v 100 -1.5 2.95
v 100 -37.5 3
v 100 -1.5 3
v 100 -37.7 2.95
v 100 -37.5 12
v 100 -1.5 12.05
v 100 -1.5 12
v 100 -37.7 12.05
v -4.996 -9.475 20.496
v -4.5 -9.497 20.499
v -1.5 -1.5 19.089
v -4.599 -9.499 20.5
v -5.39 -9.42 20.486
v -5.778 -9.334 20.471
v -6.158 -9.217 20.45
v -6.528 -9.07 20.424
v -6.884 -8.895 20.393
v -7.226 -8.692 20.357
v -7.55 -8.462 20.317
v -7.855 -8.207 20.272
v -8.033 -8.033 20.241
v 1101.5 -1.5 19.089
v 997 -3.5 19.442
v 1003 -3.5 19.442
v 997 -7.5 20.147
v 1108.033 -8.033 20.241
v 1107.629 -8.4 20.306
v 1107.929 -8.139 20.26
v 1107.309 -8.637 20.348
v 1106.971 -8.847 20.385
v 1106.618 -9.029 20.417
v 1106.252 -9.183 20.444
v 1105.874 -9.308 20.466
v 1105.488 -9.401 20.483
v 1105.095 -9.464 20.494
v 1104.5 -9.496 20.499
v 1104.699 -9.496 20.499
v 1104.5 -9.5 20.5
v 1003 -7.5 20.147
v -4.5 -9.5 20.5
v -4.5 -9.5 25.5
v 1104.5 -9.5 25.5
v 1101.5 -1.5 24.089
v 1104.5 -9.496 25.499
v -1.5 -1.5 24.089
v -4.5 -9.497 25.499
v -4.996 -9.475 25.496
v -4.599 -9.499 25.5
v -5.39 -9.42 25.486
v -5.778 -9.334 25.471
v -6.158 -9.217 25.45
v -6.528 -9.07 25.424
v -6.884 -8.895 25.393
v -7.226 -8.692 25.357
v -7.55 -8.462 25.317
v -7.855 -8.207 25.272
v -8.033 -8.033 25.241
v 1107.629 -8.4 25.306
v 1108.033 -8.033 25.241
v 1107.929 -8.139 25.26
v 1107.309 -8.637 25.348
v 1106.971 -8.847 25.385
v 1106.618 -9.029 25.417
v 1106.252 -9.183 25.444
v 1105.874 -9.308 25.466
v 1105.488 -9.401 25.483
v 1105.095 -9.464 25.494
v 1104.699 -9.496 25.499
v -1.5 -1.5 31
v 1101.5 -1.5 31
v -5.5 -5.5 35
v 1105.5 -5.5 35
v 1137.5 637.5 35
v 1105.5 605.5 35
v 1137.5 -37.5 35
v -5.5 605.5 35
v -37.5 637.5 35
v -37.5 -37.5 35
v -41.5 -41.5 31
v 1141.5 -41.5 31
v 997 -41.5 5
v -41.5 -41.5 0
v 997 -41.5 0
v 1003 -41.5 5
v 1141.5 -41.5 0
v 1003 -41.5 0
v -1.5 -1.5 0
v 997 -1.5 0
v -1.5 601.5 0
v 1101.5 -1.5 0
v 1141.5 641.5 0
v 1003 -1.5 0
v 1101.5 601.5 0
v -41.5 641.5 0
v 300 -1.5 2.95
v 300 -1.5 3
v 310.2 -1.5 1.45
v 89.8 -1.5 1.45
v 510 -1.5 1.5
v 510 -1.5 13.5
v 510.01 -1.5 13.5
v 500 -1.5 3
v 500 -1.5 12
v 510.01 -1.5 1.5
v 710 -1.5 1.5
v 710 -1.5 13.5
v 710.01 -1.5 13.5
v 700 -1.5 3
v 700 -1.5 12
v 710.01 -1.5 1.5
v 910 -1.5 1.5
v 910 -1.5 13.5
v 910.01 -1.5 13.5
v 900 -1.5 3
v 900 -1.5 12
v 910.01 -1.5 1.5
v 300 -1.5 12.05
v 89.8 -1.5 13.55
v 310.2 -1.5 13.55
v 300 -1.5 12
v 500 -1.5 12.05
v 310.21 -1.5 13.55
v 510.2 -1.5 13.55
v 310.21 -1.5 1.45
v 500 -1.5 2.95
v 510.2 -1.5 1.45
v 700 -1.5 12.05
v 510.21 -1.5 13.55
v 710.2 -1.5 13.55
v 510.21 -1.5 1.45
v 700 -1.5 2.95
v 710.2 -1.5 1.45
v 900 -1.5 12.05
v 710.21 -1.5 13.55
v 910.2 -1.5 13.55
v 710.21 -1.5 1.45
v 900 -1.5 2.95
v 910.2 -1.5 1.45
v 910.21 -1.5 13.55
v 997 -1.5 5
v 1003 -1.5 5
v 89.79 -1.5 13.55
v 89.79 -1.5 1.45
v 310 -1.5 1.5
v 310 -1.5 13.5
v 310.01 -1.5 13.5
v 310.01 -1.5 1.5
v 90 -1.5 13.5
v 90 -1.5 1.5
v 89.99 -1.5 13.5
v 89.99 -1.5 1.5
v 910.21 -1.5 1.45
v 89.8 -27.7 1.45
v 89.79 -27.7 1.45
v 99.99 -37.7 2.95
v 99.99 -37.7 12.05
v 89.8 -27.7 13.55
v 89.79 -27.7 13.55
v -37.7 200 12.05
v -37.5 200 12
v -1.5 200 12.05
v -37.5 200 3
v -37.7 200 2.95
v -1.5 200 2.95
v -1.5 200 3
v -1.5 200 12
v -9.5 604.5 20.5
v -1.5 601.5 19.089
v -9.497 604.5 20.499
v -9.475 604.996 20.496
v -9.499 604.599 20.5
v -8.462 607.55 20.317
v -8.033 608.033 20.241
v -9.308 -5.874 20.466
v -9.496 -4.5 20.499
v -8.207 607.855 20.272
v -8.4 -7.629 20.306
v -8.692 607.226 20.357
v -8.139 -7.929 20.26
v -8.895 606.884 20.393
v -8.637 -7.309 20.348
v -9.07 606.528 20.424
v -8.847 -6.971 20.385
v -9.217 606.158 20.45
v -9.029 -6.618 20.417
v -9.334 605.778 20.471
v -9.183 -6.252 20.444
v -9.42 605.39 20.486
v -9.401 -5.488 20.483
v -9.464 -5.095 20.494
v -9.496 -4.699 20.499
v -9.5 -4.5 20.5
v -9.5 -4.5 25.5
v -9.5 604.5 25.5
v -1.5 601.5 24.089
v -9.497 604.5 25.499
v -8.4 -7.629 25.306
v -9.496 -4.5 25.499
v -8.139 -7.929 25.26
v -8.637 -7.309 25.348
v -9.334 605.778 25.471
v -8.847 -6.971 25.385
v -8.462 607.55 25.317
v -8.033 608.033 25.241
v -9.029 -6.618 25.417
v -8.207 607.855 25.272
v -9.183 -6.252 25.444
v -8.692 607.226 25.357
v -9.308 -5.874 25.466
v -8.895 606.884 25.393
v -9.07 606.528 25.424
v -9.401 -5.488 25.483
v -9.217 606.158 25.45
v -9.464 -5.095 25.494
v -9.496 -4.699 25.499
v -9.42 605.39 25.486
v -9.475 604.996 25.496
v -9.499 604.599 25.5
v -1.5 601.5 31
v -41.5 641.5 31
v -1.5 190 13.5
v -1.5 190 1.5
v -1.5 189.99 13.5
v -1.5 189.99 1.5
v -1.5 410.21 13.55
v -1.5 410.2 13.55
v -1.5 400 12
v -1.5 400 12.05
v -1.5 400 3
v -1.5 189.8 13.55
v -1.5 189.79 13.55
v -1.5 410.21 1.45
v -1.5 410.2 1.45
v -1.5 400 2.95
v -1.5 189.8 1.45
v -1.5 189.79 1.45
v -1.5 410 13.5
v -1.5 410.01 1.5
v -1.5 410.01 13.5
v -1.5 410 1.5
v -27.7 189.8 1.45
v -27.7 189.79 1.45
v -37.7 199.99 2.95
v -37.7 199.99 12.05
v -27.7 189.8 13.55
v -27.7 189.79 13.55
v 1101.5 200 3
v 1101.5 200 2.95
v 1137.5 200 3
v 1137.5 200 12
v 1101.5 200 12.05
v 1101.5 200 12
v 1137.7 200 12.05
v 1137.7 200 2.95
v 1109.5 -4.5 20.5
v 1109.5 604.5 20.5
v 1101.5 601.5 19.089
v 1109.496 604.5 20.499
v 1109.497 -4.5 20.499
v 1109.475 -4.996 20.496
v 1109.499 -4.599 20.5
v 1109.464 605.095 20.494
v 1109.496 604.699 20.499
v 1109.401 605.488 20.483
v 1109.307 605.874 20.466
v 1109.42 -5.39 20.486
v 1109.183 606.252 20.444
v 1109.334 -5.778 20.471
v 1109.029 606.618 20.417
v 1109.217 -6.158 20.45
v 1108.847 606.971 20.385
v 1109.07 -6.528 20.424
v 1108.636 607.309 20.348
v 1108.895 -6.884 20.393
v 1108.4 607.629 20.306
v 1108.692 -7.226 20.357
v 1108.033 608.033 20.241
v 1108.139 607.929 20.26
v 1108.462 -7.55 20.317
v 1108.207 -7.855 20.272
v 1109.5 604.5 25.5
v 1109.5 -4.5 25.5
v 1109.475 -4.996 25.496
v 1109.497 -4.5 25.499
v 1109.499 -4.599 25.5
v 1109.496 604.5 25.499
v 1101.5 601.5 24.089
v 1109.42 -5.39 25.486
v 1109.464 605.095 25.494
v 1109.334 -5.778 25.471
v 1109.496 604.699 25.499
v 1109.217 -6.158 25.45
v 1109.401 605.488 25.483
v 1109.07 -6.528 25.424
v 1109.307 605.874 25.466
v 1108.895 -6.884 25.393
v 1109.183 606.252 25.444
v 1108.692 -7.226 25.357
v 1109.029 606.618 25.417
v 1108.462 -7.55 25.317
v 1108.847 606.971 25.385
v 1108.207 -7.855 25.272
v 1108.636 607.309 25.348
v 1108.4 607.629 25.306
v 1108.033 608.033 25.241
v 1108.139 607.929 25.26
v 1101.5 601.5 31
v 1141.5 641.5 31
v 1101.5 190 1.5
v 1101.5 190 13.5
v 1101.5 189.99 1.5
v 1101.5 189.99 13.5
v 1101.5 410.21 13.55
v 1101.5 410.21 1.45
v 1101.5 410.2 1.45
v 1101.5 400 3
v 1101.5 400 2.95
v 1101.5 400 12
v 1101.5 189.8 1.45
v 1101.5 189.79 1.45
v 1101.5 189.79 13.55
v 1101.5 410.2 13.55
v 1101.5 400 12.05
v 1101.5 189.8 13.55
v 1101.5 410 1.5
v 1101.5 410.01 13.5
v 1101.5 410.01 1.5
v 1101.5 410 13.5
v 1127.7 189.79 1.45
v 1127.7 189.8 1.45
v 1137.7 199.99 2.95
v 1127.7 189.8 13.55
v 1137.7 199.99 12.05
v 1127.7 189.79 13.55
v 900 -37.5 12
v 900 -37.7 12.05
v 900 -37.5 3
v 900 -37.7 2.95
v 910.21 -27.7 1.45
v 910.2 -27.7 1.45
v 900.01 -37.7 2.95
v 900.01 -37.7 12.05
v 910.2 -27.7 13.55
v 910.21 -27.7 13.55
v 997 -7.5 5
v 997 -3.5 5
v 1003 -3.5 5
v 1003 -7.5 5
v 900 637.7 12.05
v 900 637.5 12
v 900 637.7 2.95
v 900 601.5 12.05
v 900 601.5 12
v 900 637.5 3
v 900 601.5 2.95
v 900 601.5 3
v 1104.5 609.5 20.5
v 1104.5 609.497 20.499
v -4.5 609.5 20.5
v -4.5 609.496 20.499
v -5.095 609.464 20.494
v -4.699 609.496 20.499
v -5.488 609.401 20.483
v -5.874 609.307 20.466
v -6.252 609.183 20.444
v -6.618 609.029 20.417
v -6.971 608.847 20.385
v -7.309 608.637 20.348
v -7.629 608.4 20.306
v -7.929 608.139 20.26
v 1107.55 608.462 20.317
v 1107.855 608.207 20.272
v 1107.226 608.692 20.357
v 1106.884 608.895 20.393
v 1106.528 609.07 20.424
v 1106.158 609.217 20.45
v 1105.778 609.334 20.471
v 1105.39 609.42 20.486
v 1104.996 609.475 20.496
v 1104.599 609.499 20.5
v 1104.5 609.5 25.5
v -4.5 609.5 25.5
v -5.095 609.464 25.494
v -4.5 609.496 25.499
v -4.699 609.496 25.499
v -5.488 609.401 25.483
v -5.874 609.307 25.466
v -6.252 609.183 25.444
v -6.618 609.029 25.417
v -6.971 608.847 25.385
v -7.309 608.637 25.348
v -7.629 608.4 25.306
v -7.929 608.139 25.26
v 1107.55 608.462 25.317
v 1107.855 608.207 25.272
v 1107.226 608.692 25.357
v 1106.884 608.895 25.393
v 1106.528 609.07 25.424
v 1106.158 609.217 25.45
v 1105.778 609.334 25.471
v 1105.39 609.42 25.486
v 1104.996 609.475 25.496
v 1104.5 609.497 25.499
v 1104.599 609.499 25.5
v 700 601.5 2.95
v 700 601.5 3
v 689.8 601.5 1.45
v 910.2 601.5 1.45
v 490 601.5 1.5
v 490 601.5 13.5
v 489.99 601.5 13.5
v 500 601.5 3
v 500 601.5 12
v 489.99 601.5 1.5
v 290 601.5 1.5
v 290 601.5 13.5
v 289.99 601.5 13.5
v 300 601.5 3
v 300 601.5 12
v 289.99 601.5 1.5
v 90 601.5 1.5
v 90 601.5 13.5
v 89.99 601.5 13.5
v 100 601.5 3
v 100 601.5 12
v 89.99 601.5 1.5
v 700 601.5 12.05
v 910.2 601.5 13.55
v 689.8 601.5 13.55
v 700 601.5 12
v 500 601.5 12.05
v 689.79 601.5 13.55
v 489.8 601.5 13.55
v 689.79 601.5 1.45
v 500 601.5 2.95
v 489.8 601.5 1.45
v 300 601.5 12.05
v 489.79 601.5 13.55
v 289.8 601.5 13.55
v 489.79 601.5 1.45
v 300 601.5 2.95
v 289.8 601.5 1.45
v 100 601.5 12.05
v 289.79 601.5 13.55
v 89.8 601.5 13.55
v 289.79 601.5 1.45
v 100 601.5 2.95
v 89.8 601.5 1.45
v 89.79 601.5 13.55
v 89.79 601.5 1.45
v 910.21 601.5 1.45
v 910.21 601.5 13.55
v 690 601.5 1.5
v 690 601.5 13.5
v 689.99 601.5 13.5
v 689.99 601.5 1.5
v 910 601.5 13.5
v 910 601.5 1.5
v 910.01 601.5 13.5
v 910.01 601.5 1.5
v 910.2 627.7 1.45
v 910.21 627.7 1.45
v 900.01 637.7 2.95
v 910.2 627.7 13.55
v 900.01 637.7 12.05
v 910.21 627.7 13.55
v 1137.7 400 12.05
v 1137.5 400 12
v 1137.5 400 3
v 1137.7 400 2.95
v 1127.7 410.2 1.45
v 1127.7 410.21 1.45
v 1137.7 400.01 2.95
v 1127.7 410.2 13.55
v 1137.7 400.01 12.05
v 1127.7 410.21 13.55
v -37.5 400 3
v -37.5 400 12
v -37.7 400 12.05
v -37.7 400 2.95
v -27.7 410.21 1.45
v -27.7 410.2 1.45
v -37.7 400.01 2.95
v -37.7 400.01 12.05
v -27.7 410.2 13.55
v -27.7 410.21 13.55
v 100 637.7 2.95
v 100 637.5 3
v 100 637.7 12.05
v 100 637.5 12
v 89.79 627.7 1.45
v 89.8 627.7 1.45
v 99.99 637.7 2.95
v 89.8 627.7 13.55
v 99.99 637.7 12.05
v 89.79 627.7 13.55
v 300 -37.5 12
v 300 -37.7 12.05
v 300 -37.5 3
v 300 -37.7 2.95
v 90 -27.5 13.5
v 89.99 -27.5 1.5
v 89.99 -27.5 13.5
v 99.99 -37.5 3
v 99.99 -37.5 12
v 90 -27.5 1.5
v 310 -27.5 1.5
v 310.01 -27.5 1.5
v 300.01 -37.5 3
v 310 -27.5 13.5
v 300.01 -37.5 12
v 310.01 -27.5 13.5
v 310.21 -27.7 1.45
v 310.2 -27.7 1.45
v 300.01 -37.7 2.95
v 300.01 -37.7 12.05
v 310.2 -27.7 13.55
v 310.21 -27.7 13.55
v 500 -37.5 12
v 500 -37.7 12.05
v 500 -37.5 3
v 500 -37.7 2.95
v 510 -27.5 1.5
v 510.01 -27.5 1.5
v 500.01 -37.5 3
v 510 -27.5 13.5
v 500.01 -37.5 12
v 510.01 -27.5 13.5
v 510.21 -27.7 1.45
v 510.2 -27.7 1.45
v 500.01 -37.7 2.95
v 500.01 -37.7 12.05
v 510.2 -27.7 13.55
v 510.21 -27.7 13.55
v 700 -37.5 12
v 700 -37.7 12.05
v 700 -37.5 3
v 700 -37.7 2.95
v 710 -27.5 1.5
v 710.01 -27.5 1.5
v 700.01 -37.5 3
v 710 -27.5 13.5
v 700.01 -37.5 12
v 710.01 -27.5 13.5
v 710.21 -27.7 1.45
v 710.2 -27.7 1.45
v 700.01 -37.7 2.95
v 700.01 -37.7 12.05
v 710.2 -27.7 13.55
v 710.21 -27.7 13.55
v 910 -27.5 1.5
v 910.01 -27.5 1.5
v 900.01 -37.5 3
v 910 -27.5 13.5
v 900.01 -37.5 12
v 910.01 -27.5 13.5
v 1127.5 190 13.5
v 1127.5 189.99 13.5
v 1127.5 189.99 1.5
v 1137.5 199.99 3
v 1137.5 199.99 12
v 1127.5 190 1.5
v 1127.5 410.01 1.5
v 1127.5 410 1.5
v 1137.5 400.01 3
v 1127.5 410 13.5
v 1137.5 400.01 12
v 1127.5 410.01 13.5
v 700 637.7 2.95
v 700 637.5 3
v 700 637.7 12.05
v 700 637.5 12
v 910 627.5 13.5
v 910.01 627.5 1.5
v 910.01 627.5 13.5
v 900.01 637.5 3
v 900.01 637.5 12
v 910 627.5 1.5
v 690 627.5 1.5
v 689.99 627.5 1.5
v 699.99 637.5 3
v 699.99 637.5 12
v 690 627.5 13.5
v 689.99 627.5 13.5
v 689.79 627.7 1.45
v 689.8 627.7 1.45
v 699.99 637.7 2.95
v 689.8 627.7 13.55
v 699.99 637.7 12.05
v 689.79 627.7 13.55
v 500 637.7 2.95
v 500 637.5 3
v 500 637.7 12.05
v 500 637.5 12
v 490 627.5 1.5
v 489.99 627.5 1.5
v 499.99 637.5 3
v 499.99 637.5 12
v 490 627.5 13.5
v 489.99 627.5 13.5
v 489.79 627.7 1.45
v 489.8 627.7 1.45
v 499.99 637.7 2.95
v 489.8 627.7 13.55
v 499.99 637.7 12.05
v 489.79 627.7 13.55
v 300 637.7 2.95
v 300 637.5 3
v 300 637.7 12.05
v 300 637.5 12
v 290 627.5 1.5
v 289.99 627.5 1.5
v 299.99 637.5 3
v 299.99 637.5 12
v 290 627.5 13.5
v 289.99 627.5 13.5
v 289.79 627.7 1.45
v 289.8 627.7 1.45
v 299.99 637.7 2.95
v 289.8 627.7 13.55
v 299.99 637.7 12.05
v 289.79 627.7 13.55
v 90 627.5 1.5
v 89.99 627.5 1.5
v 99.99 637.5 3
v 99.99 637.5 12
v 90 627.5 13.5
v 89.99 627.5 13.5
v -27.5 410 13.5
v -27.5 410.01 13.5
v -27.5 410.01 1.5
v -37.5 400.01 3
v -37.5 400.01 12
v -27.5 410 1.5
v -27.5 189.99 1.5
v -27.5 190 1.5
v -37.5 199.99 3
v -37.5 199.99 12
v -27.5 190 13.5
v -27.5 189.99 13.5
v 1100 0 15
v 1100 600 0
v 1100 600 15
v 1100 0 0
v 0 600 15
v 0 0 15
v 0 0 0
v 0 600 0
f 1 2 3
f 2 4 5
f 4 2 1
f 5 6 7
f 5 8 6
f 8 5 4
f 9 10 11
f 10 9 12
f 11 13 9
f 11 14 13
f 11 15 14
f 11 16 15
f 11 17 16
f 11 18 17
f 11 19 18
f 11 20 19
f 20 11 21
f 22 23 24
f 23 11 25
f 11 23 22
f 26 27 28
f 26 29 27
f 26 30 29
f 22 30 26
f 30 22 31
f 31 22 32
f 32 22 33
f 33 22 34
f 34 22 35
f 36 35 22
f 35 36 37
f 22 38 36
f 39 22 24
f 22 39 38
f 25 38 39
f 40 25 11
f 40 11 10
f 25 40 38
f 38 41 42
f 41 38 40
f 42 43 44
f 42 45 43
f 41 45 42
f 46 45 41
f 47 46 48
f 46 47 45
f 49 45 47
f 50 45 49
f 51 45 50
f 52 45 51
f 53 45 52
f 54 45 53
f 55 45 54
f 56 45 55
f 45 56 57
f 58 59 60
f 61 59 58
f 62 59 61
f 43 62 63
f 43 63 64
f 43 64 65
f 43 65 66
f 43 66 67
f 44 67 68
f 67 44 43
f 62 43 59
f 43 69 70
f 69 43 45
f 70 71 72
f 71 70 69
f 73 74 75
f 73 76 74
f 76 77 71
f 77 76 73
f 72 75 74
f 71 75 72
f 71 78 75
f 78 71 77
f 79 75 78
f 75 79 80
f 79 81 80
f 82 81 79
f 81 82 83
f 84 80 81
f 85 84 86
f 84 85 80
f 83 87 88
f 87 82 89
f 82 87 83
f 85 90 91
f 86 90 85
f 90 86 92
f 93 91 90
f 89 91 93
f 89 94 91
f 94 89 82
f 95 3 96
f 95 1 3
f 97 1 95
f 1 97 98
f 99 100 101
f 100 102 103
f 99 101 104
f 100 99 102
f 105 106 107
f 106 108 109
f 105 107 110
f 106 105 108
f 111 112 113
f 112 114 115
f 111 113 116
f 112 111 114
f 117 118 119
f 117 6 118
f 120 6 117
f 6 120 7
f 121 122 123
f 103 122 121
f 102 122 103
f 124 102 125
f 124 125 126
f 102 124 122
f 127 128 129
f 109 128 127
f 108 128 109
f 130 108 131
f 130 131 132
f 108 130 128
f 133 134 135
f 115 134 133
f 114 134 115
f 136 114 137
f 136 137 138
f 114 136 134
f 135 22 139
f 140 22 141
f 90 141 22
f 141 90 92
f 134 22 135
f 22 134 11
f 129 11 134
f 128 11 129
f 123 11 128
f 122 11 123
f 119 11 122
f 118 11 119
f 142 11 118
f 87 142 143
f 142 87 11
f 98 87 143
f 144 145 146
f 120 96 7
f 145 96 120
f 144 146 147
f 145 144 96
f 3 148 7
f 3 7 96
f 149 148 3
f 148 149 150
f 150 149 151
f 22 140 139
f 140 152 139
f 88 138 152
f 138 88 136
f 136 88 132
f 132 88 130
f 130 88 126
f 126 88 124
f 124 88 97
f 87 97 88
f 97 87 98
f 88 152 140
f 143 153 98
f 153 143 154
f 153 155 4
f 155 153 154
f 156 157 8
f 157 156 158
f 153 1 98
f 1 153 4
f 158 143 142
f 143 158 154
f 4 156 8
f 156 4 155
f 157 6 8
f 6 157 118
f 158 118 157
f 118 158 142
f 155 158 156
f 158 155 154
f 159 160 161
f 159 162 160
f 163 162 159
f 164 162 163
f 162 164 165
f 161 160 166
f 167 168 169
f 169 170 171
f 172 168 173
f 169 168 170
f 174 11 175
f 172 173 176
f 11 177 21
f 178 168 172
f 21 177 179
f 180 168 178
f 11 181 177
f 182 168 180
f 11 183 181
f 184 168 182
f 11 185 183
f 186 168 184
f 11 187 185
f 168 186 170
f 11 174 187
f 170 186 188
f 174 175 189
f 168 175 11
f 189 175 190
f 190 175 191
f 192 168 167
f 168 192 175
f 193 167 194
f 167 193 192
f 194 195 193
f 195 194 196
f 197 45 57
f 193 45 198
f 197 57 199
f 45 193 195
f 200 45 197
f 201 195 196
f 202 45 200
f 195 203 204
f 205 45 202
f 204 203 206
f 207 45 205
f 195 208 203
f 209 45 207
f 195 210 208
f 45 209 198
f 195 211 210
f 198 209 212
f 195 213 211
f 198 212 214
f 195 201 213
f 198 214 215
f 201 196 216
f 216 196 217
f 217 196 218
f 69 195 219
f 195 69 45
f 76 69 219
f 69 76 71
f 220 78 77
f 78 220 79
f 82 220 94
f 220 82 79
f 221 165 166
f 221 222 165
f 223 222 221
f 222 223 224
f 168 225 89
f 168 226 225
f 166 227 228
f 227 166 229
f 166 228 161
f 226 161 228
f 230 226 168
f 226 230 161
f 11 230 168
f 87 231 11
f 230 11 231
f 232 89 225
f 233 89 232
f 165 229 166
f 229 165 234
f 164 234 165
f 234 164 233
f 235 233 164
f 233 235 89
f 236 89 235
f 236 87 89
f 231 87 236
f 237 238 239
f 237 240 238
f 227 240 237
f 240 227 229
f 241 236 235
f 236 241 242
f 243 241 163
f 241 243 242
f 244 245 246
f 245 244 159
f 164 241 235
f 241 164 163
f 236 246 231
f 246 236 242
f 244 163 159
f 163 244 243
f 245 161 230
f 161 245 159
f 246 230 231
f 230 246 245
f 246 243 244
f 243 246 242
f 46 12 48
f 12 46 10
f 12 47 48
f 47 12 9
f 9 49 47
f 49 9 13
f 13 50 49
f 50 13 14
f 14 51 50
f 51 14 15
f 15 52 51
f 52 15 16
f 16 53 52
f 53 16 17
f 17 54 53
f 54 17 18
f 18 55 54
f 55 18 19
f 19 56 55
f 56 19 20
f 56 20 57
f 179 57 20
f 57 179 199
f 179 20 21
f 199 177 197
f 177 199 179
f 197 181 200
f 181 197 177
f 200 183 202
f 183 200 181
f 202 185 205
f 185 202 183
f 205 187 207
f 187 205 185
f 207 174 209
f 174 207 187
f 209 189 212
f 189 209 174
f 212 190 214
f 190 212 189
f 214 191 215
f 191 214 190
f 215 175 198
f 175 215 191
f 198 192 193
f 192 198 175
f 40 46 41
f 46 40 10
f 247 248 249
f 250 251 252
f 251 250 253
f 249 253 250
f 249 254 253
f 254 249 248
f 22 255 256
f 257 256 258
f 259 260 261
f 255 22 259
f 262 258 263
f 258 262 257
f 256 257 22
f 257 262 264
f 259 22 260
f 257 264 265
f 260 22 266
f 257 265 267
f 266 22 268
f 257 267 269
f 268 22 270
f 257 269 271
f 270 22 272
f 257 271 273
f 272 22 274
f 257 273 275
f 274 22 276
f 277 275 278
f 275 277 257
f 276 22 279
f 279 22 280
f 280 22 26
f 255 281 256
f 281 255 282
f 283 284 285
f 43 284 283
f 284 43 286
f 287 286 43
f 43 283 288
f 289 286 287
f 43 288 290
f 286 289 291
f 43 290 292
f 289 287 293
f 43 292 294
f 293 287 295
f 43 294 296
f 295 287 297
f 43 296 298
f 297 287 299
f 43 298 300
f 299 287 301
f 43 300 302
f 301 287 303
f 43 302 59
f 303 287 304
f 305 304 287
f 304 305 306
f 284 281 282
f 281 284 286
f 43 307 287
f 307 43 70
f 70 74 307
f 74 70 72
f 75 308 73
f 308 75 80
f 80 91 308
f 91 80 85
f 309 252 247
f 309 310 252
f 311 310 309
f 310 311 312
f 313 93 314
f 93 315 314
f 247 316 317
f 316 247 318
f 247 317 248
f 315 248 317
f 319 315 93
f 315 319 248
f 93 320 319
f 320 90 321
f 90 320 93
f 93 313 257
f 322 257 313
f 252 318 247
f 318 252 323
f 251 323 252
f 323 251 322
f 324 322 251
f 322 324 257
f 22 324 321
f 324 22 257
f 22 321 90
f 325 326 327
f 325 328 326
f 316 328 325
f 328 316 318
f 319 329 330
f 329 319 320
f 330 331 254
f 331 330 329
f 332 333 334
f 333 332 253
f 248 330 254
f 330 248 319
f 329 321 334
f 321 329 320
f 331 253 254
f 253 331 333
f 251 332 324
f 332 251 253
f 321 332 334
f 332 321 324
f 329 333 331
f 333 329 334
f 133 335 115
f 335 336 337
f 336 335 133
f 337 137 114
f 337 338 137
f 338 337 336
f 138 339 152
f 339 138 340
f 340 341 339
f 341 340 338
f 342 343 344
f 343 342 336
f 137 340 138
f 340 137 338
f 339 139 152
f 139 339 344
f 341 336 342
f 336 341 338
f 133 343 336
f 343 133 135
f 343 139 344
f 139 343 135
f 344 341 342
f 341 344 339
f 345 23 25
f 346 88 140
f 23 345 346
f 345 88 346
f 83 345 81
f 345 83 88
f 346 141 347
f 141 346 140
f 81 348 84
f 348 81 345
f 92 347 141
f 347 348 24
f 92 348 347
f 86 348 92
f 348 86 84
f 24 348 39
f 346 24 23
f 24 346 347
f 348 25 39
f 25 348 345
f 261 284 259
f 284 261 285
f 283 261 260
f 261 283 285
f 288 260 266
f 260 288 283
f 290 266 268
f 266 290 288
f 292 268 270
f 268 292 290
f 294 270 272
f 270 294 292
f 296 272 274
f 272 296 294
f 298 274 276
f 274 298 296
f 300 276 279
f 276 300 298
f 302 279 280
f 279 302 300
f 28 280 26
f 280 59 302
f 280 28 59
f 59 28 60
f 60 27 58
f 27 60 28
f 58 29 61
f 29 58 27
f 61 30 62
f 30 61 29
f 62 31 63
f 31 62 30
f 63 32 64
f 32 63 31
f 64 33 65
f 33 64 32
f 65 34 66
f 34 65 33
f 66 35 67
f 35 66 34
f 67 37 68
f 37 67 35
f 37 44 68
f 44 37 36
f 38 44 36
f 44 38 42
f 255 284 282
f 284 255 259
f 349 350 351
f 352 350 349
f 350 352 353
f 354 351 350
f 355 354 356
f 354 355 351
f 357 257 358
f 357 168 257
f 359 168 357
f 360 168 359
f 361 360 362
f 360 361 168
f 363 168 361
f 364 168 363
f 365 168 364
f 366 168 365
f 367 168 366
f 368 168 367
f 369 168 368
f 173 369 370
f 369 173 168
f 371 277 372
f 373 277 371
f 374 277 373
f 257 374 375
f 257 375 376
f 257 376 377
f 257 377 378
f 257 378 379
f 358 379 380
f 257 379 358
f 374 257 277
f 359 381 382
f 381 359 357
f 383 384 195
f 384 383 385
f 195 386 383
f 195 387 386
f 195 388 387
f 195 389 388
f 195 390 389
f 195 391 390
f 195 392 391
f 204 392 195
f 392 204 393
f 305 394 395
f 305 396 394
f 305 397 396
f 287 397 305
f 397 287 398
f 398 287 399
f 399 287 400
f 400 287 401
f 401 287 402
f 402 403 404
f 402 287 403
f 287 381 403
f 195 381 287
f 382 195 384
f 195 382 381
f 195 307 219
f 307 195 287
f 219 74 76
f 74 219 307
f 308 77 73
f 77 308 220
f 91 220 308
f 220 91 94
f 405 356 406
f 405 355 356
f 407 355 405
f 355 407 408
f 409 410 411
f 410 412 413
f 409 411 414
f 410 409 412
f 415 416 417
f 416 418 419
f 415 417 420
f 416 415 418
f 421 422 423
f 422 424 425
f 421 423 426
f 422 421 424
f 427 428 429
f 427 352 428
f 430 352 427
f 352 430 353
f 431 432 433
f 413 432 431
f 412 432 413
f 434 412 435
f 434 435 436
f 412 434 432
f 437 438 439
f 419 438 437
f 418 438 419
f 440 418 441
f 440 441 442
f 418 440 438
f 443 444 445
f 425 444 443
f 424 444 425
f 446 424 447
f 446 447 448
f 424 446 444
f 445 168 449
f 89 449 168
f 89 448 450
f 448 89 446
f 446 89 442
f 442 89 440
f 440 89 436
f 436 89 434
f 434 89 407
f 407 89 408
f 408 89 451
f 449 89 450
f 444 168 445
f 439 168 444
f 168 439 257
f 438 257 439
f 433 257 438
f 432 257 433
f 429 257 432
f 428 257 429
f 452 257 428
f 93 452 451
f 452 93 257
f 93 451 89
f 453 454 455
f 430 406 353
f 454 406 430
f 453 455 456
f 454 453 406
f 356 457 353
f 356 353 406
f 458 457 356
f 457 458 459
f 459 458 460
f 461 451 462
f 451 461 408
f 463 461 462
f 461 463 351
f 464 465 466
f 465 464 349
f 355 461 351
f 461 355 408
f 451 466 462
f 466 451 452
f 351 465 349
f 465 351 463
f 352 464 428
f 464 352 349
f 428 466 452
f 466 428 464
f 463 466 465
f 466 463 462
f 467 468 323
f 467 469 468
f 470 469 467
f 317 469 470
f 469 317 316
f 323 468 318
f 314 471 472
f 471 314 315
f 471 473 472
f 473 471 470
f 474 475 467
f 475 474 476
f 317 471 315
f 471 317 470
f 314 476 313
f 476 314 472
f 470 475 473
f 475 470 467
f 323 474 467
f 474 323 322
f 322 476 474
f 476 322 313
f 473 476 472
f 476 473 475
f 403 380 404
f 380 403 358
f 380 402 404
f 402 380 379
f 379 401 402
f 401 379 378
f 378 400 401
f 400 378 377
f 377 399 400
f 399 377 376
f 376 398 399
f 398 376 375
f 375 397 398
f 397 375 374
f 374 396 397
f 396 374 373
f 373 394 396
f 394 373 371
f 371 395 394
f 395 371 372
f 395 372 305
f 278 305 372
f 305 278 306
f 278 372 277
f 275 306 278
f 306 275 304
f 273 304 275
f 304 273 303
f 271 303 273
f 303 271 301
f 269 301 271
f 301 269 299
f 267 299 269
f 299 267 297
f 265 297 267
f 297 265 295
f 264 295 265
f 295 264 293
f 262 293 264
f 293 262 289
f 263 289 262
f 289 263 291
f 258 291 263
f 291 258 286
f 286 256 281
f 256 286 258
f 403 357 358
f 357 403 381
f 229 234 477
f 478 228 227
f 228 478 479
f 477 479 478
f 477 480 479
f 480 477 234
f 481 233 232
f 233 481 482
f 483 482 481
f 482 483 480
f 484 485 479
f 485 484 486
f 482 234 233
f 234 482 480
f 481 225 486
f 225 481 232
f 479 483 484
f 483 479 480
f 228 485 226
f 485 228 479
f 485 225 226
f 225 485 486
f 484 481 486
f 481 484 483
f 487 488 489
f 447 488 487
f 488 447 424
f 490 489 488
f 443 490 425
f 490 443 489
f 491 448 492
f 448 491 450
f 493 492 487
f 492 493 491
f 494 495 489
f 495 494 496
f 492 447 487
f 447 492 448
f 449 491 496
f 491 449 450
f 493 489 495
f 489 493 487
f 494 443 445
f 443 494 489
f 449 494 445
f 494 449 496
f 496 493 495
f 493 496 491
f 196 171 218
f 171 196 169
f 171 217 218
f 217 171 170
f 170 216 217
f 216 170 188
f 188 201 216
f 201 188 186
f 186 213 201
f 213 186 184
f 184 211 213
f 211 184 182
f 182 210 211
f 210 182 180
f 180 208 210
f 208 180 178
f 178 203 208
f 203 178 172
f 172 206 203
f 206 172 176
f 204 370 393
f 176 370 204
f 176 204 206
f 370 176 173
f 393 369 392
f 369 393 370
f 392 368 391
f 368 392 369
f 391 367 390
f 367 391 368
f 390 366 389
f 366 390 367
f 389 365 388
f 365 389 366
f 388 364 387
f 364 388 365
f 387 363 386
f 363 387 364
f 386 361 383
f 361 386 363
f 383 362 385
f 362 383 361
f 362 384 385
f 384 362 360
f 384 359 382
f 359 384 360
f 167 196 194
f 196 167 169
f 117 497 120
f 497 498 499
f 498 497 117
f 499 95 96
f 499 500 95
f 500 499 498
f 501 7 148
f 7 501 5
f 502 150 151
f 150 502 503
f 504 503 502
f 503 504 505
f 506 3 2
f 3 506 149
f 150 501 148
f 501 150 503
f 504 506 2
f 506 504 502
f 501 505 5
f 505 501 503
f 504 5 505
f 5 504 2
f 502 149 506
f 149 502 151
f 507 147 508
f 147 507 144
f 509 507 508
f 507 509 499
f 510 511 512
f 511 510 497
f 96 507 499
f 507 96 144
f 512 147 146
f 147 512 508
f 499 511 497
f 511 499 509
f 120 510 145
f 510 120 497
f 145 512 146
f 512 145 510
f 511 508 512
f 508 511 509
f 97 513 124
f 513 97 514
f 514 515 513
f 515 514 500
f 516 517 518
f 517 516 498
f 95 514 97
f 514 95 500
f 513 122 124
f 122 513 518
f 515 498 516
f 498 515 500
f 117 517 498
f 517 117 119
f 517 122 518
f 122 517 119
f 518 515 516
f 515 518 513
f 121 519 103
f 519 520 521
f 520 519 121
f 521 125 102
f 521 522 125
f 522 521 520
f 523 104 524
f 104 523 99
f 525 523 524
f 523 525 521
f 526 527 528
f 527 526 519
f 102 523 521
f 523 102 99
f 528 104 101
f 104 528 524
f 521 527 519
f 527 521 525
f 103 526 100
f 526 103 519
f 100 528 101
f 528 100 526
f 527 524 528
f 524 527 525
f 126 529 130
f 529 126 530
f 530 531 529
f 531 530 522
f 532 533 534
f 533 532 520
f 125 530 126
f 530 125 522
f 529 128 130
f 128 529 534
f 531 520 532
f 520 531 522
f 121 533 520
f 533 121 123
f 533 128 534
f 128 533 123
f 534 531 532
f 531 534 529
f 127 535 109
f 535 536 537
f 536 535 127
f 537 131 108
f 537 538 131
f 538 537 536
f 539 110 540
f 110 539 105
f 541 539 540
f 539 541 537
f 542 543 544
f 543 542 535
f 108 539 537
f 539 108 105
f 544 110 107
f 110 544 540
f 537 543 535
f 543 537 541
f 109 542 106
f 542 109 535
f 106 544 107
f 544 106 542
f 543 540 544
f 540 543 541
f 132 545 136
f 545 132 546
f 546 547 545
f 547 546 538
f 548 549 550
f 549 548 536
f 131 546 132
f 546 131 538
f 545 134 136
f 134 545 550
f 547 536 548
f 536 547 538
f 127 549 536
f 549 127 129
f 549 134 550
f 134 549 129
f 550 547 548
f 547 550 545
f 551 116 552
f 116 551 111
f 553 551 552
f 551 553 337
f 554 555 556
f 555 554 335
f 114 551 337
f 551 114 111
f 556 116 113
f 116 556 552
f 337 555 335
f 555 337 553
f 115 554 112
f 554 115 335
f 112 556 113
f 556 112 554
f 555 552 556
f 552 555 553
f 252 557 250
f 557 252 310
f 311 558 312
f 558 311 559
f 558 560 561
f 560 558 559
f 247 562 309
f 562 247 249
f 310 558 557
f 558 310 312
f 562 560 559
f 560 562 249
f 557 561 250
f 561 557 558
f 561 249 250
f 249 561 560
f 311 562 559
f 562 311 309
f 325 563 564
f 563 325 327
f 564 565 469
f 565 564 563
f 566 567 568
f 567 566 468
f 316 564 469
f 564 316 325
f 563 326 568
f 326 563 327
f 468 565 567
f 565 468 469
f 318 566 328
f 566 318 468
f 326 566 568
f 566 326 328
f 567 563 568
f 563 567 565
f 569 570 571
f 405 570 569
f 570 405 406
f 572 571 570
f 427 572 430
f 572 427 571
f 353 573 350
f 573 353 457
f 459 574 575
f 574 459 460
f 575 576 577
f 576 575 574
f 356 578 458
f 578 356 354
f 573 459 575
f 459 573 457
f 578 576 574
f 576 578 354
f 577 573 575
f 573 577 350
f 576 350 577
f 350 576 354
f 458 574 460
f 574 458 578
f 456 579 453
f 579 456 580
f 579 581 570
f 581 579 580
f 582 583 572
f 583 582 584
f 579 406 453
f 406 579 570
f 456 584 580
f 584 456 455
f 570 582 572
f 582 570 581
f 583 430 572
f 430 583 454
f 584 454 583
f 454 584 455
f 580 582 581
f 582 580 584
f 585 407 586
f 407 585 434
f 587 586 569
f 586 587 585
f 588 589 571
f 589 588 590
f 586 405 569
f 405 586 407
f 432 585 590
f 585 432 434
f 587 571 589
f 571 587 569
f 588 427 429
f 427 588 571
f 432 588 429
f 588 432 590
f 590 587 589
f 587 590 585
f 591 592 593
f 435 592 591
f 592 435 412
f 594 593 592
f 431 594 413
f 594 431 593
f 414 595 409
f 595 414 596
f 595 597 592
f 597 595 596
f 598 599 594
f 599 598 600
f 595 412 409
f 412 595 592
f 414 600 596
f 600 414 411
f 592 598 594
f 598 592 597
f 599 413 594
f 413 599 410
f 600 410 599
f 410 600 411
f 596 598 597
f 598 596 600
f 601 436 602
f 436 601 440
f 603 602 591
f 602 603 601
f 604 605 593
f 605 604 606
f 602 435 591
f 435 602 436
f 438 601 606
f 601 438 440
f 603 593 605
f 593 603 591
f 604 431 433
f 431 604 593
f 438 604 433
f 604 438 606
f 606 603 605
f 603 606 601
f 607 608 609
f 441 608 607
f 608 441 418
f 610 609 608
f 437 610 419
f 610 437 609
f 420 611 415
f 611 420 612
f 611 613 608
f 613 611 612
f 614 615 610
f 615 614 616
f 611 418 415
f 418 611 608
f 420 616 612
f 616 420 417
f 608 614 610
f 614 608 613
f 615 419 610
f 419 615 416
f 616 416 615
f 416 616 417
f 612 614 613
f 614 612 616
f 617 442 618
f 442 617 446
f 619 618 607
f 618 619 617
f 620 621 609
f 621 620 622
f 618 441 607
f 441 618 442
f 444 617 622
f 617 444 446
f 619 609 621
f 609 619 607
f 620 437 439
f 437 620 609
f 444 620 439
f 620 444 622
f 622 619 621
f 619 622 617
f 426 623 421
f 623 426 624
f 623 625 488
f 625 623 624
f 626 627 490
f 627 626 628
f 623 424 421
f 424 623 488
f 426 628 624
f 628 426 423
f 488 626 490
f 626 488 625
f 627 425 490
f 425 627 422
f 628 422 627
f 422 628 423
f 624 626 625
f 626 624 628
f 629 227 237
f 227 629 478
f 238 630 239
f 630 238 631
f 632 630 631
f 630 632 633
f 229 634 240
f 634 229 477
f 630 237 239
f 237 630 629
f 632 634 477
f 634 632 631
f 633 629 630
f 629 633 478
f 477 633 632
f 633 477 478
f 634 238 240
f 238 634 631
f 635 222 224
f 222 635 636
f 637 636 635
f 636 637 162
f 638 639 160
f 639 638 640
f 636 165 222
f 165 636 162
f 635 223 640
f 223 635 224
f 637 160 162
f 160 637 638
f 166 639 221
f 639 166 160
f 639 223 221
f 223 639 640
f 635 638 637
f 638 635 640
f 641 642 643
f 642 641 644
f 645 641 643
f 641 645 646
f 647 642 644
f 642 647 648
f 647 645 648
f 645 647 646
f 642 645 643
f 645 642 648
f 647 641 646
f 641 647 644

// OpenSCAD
// Segmented LED frame for a 1100 x 600 relief tile artwork (200 mm tile grid).
//
// Frame coordinates: the art occupies [0, art_w] x [0, art_h] on the wall,
// z points away from the wall. Each side is built in a local frame:
//   X = along the side, Y = inset from the outer edge (0 outside, face_w
//   inside), Z = off the wall.
//
// Joints are dovetails that slide in from the art side (+Y). The socket is
// open only on the inner face below the tile height, so it is hidden behind
// the tiles; front, outside and back show a plain seam.

// parts: corner-bl corner-br corner-tl corner-tr straight-tt straight-st fit-test-0.05 fit-test-0.10

part = "assembly"; // [assembly, corner-bl, corner-br, corner-tl, corner-tr, straight-tt, straight-st, fit-test-0.05, fit-test-0.10]

/* [Art] */
art_w = 1100;          // mm
art_h = 600;           // mm
art_depth = 15;        // mm, tile height off the wall
art_gap = 1.5;         // mm, gap between tiles and frame inner face

/* [Profile] */
face_w = 40;           // mm, frame width seen from the front
depth = 35;            // mm, frame height off the wall
bevel = 4;             // mm, 45 degree bevel on both front edges

/* [LED slot] */
led_z = 23;            // mm, LED centre off the wall (8 above the tiles)
slot_h = 5;            // mm, slot height at the back wall
slot_d = 8;            // mm, slot depth into the frame
slot_tilt = 10;        // deg, slot floor/ceiling slope down toward the art
slot_corner_r = 5;     // mm, strip bend radius at the corners

/* [Segmentation] */
seam_x = [100, 300, 500, 700, 900]; // mm, art coords, on tile seams
seam_y = [200, 400];                // mm, art coords, on tile seams

/* [Dovetail] */
tail_len = 10;         // mm, protrusion past the seam
tail_root = [3, 12];   // mm, Z span at the seam
tail_tip = [1.5, 13.5];// mm, Z span at the tip
tail_skin = 4;         // mm, outer skin left in front of the tail (Y)
fit = 0.05;            // mm, clearance per flank (coupon-tested: 0.15 loose, 0.05 snug)
seat_fit = 0.2;        // mm, extra clearance at the tip and seat

/* [Cable] */
cable_x = 1000;        // mm, art x where the cable channel crosses the bottom
cable_w = 6;           // mm
cable_d = 5;           // mm, groove depth into the back face
lead_hole = [4, 34];   // mm, [width in Y, Y start] of the hole from slot to groove

$fa = 2;
$fs = 0.4;

ox = -art_gap - face_w;                 // outer edge in art coords
outer_w = art_w + 2 * (art_gap + face_w);
outer_h = art_h + 2 * (art_gap + face_w);
leg_l = seam_x[0] - ox;                 // bottom-left / top-left horizontal leg
leg_r = art_w - seam_x[len(seam_x) - 1] - ox;
leg_b = seam_y[0] - ox;
leg_t = art_h - seam_y[len(seam_y) - 1] - ox;
straight_len = seam_x[1] - seam_x[0];
assert(
    [for (i = [1 : len(seam_x) - 1]) seam_x[i] - seam_x[i - 1]] == [for (i = [1 : len(seam_x) - 1]) straight_len]
        && seam_y[1] - seam_y[0] == straight_len,
    "all straight pieces must share one length"
);

slot_drop = slot_d * tan(slot_tilt);
slot_back = face_w - slot_d;

function profile() = [
    [0, 0],
    [face_w, 0],
    [face_w, led_z - slot_h / 2 - slot_drop],
    [slot_back, led_z - slot_h / 2],
    [slot_back, led_z + slot_h / 2],
    [face_w, led_z + slot_h / 2 - slot_drop],
    [face_w, depth - bevel],
    [face_w - bevel, depth],
    [bevel, depth],
    [0, depth - bevel],
];

module bar(x0, x1) {
    translate([x0, 0, 0]) rotate([90, 0, 90])
        linear_extrude(x1 - x0) polygon(profile());
}

// Tail pointing +X from a seam at X = 0. With `c` > 0 it becomes the socket
// cutter: flanks grow by c, the seat and tip by seat_fit, and it opens past
// the seam and the inner face.
module tail(c = 0) {
    s = c > 0 ? seat_fit : 0;
    y_end = face_w + (c > 0 ? 1 : 0);
    module slice(x, y0, zs)
        translate([x, y0, zs[0] - c]) cube([0.01, y_end - y0, zs[1] - zs[0] + 2 * c]);
    hull() {
        slice(0, tail_skin - s, tail_root);
        slice(tail_len + s, tail_skin + tail_len - s, tail_tip);
    }
    if (c > 0) hull() {
        slice(-1, tail_skin - s, tail_root);
        slice(0, tail_skin - s, tail_root);
    }
}

module socket(c = fit) { tail(c); }

module straight(left, right) {
    difference() {
        union() {
            bar(0, straight_len);
            if (left == "tail") mirror([1, 0, 0]) tail();
            if (right == "tail") translate([straight_len, 0, 0]) tail();
        }
        if (left == "socket") socket();
        if (right == "socket") translate([straight_len, 0, 0]) mirror([1, 0, 0]) socket();
    }
}

module cable_cut(at) {
    translate([at - cable_w / 2, -1, -1]) cube([cable_w, face_w + 2, cable_d + 1]);
    translate([at - cable_w / 2, lead_hole[1], cable_d - 0.5])
        cube([cable_w, lead_hole[0], led_z - cable_d]);
}

// One leg along +X from the outer corner, mitred on Y <= X, socket at the far end.
module leg(len, cable_at) {
    difference() {
        intersection() {
            bar(0, len);
            linear_extrude(depth + 1) polygon([[0, 0], [len + 1, 0], [len + 1, len + 1]]);
        }
        translate([len, 0, 0]) mirror([1, 0, 0]) socket();
        if (!is_undef(cable_at)) cable_cut(cable_at);
    }
}

module slot_fillet() {
    z0 = led_z - slot_h / 2 - slot_drop - 1;
    translate([0, 0, z0]) linear_extrude(slot_h + 2 + slot_drop)
        difference() {
            translate([slot_back - 0.01, slot_back - 0.01]) square(slot_corner_r + 0.01);
            translate([slot_back + slot_corner_r, slot_back + slot_corner_r]) circle(slot_corner_r);
        }
}

// X leg length a, Y leg length b; cable channel optional on the Y leg.
module corner(a, b, cable_on_b) {
    union() {
        leg(a);
        mirror([1, -1, 0]) leg(b, cable_on_b);
        slot_fillet();
    }
}

corners = [
    // name,        world origin,             rot, X leg, Y leg, cable on Y leg
    ["corner-bl", [ox, ox],                    0,  leg_l, leg_b, undef],
    ["corner-br", [ox + outer_w, ox],          90, leg_b, leg_r, ox + outer_w - cable_x],
    ["corner-tr", [ox + outer_w, ox + outer_h], 180, leg_r, leg_t, undef],
    ["corner-tl", [ox, ox + outer_h],          270, leg_t, leg_l, undef],
];

function corner_def(name) = [for (c = corners) if (c[0] == name) c][0];

module corner_named(name) {
    c = corner_def(name);
    corner(c[3], c[4], c[5]);
}

// Print orientation: one leg lying on its outer face, the other standing up.
// The longer leg lies down; on a tie, the leg with the cable channel does, so
// the groove prints as a vertical slot.
module print_corner(name) {
    c = corner_def(name);
    x_leg_down = c[3] > c[4] || (c[3] == c[4] && is_undef(c[5]));
    if (x_leg_down) rotate([90, 0, 0]) corner_named(name);
    else rotate([0, -90, 0]) corner_named(name);
}

module print_straight(left, right) {
    rotate([90, 0, 0]) straight(left, right);
}

module side_straights(count, start) {
    for (i = [0 : count - 1])
        translate([start + i * straight_len, 0, 0])
            if (i == 0) straight("tail", "tail");
            else straight("socket", "tail");
}

module assembly() {
    for (c = corners)
        translate(c[1]) rotate(c[2]) color("SteelBlue") corner(c[3], c[4], c[5]);
    color("LightSteelBlue") {
        translate([ox, ox]) side_straights(len(seam_x) - 1, leg_l);
        translate([ox + outer_w, ox]) rotate(90) side_straights(len(seam_y) - 1, leg_b);
        translate([ox + outer_w, ox + outer_h]) rotate(180) side_straights(len(seam_x) - 1, leg_r);
        translate([ox, ox + outer_h]) rotate(270) side_straights(len(seam_y) - 1, leg_t);
    }
    color("Wheat", 0.6) cube([art_w, art_h, art_depth]);
}

// Short socket-only coupon to test a clearance against an existing tail.
// The clearance is debossed on the back.
coupon_len = 30;
module fit_coupon(c) {
    difference() {
        bar(0, coupon_len);
        socket(c);
        translate([(tail_len + coupon_len) / 2 + 1, face_w / 2, -0.01])
            linear_extrude(0.6) mirror([1, 0, 0])
                text(str(c), size = 5, halign = "center", valign = "center");
    }
}

if (part == "assembly") assembly();
else if (part == "fit-test-0.05") rotate([90, 0, 0]) fit_coupon(0.05);
else if (part == "fit-test-0.10") rotate([90, 0, 0]) fit_coupon(0.10);
else if (part == "straight-tt") print_straight("tail", "tail");
else if (part == "straight-st") print_straight("socket", "tail");
else print_corner(part);
